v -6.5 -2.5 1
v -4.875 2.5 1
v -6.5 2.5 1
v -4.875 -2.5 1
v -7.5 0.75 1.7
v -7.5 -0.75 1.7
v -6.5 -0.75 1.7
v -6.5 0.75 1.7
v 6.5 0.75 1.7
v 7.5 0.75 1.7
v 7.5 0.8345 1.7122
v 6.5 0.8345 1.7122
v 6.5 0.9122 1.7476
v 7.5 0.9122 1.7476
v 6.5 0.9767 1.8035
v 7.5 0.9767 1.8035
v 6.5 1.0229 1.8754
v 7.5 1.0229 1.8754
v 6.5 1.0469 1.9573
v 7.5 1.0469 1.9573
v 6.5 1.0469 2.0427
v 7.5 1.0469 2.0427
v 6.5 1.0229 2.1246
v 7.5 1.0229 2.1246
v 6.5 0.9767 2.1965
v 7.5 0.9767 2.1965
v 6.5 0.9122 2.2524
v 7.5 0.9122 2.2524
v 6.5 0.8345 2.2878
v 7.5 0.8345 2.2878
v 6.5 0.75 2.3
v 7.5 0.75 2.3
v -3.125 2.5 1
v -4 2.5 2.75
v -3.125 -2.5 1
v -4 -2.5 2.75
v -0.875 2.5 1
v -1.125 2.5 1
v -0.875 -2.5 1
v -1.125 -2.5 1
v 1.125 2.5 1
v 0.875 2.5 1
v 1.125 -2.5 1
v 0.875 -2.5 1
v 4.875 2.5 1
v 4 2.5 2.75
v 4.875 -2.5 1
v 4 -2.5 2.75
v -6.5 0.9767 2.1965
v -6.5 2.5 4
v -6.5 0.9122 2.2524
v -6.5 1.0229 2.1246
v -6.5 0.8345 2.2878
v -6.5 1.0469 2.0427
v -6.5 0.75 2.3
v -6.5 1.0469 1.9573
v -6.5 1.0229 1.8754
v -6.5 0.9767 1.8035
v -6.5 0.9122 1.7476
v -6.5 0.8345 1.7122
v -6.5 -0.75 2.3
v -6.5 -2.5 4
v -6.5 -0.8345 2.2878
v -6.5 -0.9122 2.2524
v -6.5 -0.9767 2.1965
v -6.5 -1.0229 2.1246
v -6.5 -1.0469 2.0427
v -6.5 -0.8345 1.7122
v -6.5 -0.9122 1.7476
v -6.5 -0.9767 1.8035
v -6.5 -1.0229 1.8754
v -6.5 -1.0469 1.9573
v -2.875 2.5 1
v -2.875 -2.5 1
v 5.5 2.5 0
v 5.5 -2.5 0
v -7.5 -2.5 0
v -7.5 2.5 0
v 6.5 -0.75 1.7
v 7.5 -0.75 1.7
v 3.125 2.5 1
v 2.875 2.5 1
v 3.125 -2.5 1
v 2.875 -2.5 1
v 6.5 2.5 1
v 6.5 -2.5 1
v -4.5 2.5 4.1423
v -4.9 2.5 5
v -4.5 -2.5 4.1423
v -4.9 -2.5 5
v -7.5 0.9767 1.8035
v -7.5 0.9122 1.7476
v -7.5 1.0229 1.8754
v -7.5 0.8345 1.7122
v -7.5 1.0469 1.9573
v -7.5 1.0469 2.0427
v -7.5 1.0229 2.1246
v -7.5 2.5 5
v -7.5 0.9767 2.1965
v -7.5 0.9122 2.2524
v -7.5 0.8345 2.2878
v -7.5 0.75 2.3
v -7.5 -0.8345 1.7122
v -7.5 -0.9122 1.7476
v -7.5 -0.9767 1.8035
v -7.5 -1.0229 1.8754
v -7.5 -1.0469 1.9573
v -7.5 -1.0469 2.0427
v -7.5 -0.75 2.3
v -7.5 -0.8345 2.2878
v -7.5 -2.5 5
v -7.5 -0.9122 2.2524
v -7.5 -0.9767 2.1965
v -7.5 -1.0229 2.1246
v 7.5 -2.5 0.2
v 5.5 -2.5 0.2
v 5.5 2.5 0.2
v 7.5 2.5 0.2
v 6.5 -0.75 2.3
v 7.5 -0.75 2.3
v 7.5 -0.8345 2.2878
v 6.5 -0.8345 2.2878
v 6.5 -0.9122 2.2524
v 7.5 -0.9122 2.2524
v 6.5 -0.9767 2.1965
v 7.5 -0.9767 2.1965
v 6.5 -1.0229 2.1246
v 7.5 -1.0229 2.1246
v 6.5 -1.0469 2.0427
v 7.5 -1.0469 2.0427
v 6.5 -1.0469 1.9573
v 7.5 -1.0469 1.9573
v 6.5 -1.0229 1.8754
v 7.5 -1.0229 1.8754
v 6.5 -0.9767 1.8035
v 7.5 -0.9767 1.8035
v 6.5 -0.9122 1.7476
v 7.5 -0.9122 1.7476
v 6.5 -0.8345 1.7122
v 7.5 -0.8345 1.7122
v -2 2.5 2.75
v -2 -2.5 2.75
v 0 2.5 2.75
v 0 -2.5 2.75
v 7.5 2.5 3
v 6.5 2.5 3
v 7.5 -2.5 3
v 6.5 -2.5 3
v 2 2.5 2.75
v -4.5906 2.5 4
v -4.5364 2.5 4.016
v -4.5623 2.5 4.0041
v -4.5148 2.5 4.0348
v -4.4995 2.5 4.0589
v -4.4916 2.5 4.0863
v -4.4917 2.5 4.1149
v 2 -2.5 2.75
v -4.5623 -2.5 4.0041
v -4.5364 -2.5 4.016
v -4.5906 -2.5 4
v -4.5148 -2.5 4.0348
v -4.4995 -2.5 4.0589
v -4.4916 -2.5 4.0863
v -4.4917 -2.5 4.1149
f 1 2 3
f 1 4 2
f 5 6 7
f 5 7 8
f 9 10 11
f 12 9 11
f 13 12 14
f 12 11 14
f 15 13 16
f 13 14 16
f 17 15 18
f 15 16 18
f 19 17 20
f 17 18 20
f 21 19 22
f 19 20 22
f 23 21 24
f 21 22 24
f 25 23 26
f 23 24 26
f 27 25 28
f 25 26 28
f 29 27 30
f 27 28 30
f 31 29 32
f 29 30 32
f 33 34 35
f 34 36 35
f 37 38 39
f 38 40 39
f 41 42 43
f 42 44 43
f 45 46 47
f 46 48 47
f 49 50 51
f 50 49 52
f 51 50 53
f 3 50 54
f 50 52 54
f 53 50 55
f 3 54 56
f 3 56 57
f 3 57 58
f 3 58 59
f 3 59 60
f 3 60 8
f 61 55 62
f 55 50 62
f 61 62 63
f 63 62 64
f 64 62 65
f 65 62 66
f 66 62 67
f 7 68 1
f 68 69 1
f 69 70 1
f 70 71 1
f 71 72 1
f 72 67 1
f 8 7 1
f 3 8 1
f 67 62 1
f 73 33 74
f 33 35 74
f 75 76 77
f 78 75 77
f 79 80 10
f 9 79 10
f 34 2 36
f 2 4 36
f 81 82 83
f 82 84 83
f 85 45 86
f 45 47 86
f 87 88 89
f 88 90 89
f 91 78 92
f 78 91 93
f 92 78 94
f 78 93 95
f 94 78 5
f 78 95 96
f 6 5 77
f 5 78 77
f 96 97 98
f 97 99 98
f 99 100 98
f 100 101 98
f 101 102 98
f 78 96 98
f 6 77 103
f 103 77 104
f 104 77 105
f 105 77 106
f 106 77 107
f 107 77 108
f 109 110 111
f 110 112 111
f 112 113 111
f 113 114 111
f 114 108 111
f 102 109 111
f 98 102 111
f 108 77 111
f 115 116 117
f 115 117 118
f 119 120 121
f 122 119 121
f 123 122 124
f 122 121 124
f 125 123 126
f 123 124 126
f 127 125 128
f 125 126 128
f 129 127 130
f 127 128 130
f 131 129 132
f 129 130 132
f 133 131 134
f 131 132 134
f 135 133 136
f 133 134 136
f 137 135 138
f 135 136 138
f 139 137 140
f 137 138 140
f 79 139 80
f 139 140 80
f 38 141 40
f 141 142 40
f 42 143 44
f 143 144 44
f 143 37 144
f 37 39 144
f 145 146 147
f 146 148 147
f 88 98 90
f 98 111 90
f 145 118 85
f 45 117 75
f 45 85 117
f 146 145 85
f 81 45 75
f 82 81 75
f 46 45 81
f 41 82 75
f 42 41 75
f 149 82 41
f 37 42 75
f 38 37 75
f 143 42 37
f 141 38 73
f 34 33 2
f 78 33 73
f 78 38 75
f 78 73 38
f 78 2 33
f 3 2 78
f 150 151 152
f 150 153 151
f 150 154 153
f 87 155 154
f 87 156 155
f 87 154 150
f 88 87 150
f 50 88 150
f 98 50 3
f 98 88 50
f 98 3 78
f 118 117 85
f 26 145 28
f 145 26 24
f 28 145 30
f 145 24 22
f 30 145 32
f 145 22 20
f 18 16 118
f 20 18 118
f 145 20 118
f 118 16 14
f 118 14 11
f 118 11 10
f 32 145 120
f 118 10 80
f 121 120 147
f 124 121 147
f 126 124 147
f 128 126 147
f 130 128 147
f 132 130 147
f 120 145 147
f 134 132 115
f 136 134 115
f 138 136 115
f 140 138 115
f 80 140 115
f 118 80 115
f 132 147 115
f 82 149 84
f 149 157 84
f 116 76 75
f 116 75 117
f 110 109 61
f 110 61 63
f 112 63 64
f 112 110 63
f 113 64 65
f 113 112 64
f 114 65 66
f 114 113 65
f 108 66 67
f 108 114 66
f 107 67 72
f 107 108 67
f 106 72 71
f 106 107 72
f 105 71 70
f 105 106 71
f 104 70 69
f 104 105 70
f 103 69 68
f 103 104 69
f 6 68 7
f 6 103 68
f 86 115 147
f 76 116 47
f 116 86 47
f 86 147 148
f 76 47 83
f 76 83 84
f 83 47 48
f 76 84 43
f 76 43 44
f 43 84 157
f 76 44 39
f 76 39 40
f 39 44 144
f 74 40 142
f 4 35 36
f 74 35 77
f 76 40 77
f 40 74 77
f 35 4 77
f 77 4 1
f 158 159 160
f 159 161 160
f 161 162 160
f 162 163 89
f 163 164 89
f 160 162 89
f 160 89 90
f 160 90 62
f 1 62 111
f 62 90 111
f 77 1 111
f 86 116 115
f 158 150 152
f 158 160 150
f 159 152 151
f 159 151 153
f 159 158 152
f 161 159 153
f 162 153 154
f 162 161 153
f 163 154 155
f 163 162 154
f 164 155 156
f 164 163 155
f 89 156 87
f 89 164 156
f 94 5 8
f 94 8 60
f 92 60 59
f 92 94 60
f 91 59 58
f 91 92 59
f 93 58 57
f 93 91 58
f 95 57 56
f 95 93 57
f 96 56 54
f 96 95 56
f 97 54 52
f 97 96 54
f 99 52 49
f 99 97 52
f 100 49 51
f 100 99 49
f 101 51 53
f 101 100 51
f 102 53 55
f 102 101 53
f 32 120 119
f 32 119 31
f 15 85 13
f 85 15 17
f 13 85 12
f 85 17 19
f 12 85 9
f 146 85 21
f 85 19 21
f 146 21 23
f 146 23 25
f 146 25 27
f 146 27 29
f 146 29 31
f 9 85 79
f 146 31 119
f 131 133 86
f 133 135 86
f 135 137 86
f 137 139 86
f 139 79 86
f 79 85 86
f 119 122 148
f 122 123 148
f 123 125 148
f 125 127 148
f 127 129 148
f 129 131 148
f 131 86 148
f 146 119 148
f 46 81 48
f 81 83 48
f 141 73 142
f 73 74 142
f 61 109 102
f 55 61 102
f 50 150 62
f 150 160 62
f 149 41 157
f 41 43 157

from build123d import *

# Parameters (mm, degrees)
PAD028_DEPTH    = 2.5
POCKET033_DEPTH = 2


with BuildPart() as part:
    # Sketch063 → Pad028 (new body, symmetric)
    with BuildSketch(Plane.XZ):
        with BuildLine():
            Line((-7.5, 0), (-7.5, 5))
            Line((-7.5, 5), (-4.89997, 5))
            Line((-4.89997, 5), (-4.5, 4.142262))
            ThreePointArc((-4.590631, 4), (-4.506292, 4.04627), (-4.5, 4.142262))
            Line((-4.590631, 4), (-6.5, 4))
            Line((-6.5, 4), (-6.5, 1))
            Line((-6.5, 1), (-5, 1))
            Line((-4.875, 1), (-5, 1))
            Line((-4.875, 1), (-4, 2.75))
            Line((-4, 2.75), (-3.125, 1))
            Line((-3.125, 1), (-2.875, 1))
            Line((-2.875, 1), (-2, 2.75))
            Line((-2, 2.75), (-1.125, 1))
            Line((-1.125, 1), (-0.875, 1))
            Line((-0.875, 1), (0, 2.75))
            Line((0, 2.75), (0.875, 1))
            Line((0.875, 1), (1.125, 1))
            Line((1.125, 1), (2, 2.75))
            Line((2, 2.75), (2.875, 1))
            Line((2.875, 1), (3.125, 1))
            Line((3.125, 1), (4, 2.75))
            Line((4, 2.75), (4.875, 1))
            Line((4.875, 1), (5, 1))
            Line((5, 1), (6.5, 1))
            Line((6.5, 1), (6.5, 3))
            Line((6.5, 3), (7.5, 3))
            Line((7.5, 3), (7.5, 0.2))
            Line((5.5, 0.2), (7.5, 0.2))
            Line((5.5, 0), (5.5, 0.2))
            Line((5.5, 0), (-7.5, 0))
        make_face()
    extrude(amount=PAD028_DEPTH, both=True)

    # Sketch062 (on Face28 of Pad028) → Pocket033 (cut)
    with BuildSketch(Plane(origin=(7.5, 0, 0), x_dir=(0, 0, 1), z_dir=(1, 0, 0))):
        with BuildLine():
            ThreePointArc((2.3, 0.75), (2, 1.05), (1.7, 0.75))
            Line((1.7, 0.75), (1.7, -0.75))
            ThreePointArc((1.7, -0.75), (2, -1.05), (2.3, -0.75))
            Line((2.3, 0.75), (2.3, -0.75))
        make_face()
    pocket033 = extrude(amount=-POCKET033_DEPTH, mode=Mode.SUBTRACT)

    # Mirrored003: Pocket033 across YZ
    add(pocket033.mirror(Plane.YZ), mode=Mode.SUBTRACT)


solid = part.part
